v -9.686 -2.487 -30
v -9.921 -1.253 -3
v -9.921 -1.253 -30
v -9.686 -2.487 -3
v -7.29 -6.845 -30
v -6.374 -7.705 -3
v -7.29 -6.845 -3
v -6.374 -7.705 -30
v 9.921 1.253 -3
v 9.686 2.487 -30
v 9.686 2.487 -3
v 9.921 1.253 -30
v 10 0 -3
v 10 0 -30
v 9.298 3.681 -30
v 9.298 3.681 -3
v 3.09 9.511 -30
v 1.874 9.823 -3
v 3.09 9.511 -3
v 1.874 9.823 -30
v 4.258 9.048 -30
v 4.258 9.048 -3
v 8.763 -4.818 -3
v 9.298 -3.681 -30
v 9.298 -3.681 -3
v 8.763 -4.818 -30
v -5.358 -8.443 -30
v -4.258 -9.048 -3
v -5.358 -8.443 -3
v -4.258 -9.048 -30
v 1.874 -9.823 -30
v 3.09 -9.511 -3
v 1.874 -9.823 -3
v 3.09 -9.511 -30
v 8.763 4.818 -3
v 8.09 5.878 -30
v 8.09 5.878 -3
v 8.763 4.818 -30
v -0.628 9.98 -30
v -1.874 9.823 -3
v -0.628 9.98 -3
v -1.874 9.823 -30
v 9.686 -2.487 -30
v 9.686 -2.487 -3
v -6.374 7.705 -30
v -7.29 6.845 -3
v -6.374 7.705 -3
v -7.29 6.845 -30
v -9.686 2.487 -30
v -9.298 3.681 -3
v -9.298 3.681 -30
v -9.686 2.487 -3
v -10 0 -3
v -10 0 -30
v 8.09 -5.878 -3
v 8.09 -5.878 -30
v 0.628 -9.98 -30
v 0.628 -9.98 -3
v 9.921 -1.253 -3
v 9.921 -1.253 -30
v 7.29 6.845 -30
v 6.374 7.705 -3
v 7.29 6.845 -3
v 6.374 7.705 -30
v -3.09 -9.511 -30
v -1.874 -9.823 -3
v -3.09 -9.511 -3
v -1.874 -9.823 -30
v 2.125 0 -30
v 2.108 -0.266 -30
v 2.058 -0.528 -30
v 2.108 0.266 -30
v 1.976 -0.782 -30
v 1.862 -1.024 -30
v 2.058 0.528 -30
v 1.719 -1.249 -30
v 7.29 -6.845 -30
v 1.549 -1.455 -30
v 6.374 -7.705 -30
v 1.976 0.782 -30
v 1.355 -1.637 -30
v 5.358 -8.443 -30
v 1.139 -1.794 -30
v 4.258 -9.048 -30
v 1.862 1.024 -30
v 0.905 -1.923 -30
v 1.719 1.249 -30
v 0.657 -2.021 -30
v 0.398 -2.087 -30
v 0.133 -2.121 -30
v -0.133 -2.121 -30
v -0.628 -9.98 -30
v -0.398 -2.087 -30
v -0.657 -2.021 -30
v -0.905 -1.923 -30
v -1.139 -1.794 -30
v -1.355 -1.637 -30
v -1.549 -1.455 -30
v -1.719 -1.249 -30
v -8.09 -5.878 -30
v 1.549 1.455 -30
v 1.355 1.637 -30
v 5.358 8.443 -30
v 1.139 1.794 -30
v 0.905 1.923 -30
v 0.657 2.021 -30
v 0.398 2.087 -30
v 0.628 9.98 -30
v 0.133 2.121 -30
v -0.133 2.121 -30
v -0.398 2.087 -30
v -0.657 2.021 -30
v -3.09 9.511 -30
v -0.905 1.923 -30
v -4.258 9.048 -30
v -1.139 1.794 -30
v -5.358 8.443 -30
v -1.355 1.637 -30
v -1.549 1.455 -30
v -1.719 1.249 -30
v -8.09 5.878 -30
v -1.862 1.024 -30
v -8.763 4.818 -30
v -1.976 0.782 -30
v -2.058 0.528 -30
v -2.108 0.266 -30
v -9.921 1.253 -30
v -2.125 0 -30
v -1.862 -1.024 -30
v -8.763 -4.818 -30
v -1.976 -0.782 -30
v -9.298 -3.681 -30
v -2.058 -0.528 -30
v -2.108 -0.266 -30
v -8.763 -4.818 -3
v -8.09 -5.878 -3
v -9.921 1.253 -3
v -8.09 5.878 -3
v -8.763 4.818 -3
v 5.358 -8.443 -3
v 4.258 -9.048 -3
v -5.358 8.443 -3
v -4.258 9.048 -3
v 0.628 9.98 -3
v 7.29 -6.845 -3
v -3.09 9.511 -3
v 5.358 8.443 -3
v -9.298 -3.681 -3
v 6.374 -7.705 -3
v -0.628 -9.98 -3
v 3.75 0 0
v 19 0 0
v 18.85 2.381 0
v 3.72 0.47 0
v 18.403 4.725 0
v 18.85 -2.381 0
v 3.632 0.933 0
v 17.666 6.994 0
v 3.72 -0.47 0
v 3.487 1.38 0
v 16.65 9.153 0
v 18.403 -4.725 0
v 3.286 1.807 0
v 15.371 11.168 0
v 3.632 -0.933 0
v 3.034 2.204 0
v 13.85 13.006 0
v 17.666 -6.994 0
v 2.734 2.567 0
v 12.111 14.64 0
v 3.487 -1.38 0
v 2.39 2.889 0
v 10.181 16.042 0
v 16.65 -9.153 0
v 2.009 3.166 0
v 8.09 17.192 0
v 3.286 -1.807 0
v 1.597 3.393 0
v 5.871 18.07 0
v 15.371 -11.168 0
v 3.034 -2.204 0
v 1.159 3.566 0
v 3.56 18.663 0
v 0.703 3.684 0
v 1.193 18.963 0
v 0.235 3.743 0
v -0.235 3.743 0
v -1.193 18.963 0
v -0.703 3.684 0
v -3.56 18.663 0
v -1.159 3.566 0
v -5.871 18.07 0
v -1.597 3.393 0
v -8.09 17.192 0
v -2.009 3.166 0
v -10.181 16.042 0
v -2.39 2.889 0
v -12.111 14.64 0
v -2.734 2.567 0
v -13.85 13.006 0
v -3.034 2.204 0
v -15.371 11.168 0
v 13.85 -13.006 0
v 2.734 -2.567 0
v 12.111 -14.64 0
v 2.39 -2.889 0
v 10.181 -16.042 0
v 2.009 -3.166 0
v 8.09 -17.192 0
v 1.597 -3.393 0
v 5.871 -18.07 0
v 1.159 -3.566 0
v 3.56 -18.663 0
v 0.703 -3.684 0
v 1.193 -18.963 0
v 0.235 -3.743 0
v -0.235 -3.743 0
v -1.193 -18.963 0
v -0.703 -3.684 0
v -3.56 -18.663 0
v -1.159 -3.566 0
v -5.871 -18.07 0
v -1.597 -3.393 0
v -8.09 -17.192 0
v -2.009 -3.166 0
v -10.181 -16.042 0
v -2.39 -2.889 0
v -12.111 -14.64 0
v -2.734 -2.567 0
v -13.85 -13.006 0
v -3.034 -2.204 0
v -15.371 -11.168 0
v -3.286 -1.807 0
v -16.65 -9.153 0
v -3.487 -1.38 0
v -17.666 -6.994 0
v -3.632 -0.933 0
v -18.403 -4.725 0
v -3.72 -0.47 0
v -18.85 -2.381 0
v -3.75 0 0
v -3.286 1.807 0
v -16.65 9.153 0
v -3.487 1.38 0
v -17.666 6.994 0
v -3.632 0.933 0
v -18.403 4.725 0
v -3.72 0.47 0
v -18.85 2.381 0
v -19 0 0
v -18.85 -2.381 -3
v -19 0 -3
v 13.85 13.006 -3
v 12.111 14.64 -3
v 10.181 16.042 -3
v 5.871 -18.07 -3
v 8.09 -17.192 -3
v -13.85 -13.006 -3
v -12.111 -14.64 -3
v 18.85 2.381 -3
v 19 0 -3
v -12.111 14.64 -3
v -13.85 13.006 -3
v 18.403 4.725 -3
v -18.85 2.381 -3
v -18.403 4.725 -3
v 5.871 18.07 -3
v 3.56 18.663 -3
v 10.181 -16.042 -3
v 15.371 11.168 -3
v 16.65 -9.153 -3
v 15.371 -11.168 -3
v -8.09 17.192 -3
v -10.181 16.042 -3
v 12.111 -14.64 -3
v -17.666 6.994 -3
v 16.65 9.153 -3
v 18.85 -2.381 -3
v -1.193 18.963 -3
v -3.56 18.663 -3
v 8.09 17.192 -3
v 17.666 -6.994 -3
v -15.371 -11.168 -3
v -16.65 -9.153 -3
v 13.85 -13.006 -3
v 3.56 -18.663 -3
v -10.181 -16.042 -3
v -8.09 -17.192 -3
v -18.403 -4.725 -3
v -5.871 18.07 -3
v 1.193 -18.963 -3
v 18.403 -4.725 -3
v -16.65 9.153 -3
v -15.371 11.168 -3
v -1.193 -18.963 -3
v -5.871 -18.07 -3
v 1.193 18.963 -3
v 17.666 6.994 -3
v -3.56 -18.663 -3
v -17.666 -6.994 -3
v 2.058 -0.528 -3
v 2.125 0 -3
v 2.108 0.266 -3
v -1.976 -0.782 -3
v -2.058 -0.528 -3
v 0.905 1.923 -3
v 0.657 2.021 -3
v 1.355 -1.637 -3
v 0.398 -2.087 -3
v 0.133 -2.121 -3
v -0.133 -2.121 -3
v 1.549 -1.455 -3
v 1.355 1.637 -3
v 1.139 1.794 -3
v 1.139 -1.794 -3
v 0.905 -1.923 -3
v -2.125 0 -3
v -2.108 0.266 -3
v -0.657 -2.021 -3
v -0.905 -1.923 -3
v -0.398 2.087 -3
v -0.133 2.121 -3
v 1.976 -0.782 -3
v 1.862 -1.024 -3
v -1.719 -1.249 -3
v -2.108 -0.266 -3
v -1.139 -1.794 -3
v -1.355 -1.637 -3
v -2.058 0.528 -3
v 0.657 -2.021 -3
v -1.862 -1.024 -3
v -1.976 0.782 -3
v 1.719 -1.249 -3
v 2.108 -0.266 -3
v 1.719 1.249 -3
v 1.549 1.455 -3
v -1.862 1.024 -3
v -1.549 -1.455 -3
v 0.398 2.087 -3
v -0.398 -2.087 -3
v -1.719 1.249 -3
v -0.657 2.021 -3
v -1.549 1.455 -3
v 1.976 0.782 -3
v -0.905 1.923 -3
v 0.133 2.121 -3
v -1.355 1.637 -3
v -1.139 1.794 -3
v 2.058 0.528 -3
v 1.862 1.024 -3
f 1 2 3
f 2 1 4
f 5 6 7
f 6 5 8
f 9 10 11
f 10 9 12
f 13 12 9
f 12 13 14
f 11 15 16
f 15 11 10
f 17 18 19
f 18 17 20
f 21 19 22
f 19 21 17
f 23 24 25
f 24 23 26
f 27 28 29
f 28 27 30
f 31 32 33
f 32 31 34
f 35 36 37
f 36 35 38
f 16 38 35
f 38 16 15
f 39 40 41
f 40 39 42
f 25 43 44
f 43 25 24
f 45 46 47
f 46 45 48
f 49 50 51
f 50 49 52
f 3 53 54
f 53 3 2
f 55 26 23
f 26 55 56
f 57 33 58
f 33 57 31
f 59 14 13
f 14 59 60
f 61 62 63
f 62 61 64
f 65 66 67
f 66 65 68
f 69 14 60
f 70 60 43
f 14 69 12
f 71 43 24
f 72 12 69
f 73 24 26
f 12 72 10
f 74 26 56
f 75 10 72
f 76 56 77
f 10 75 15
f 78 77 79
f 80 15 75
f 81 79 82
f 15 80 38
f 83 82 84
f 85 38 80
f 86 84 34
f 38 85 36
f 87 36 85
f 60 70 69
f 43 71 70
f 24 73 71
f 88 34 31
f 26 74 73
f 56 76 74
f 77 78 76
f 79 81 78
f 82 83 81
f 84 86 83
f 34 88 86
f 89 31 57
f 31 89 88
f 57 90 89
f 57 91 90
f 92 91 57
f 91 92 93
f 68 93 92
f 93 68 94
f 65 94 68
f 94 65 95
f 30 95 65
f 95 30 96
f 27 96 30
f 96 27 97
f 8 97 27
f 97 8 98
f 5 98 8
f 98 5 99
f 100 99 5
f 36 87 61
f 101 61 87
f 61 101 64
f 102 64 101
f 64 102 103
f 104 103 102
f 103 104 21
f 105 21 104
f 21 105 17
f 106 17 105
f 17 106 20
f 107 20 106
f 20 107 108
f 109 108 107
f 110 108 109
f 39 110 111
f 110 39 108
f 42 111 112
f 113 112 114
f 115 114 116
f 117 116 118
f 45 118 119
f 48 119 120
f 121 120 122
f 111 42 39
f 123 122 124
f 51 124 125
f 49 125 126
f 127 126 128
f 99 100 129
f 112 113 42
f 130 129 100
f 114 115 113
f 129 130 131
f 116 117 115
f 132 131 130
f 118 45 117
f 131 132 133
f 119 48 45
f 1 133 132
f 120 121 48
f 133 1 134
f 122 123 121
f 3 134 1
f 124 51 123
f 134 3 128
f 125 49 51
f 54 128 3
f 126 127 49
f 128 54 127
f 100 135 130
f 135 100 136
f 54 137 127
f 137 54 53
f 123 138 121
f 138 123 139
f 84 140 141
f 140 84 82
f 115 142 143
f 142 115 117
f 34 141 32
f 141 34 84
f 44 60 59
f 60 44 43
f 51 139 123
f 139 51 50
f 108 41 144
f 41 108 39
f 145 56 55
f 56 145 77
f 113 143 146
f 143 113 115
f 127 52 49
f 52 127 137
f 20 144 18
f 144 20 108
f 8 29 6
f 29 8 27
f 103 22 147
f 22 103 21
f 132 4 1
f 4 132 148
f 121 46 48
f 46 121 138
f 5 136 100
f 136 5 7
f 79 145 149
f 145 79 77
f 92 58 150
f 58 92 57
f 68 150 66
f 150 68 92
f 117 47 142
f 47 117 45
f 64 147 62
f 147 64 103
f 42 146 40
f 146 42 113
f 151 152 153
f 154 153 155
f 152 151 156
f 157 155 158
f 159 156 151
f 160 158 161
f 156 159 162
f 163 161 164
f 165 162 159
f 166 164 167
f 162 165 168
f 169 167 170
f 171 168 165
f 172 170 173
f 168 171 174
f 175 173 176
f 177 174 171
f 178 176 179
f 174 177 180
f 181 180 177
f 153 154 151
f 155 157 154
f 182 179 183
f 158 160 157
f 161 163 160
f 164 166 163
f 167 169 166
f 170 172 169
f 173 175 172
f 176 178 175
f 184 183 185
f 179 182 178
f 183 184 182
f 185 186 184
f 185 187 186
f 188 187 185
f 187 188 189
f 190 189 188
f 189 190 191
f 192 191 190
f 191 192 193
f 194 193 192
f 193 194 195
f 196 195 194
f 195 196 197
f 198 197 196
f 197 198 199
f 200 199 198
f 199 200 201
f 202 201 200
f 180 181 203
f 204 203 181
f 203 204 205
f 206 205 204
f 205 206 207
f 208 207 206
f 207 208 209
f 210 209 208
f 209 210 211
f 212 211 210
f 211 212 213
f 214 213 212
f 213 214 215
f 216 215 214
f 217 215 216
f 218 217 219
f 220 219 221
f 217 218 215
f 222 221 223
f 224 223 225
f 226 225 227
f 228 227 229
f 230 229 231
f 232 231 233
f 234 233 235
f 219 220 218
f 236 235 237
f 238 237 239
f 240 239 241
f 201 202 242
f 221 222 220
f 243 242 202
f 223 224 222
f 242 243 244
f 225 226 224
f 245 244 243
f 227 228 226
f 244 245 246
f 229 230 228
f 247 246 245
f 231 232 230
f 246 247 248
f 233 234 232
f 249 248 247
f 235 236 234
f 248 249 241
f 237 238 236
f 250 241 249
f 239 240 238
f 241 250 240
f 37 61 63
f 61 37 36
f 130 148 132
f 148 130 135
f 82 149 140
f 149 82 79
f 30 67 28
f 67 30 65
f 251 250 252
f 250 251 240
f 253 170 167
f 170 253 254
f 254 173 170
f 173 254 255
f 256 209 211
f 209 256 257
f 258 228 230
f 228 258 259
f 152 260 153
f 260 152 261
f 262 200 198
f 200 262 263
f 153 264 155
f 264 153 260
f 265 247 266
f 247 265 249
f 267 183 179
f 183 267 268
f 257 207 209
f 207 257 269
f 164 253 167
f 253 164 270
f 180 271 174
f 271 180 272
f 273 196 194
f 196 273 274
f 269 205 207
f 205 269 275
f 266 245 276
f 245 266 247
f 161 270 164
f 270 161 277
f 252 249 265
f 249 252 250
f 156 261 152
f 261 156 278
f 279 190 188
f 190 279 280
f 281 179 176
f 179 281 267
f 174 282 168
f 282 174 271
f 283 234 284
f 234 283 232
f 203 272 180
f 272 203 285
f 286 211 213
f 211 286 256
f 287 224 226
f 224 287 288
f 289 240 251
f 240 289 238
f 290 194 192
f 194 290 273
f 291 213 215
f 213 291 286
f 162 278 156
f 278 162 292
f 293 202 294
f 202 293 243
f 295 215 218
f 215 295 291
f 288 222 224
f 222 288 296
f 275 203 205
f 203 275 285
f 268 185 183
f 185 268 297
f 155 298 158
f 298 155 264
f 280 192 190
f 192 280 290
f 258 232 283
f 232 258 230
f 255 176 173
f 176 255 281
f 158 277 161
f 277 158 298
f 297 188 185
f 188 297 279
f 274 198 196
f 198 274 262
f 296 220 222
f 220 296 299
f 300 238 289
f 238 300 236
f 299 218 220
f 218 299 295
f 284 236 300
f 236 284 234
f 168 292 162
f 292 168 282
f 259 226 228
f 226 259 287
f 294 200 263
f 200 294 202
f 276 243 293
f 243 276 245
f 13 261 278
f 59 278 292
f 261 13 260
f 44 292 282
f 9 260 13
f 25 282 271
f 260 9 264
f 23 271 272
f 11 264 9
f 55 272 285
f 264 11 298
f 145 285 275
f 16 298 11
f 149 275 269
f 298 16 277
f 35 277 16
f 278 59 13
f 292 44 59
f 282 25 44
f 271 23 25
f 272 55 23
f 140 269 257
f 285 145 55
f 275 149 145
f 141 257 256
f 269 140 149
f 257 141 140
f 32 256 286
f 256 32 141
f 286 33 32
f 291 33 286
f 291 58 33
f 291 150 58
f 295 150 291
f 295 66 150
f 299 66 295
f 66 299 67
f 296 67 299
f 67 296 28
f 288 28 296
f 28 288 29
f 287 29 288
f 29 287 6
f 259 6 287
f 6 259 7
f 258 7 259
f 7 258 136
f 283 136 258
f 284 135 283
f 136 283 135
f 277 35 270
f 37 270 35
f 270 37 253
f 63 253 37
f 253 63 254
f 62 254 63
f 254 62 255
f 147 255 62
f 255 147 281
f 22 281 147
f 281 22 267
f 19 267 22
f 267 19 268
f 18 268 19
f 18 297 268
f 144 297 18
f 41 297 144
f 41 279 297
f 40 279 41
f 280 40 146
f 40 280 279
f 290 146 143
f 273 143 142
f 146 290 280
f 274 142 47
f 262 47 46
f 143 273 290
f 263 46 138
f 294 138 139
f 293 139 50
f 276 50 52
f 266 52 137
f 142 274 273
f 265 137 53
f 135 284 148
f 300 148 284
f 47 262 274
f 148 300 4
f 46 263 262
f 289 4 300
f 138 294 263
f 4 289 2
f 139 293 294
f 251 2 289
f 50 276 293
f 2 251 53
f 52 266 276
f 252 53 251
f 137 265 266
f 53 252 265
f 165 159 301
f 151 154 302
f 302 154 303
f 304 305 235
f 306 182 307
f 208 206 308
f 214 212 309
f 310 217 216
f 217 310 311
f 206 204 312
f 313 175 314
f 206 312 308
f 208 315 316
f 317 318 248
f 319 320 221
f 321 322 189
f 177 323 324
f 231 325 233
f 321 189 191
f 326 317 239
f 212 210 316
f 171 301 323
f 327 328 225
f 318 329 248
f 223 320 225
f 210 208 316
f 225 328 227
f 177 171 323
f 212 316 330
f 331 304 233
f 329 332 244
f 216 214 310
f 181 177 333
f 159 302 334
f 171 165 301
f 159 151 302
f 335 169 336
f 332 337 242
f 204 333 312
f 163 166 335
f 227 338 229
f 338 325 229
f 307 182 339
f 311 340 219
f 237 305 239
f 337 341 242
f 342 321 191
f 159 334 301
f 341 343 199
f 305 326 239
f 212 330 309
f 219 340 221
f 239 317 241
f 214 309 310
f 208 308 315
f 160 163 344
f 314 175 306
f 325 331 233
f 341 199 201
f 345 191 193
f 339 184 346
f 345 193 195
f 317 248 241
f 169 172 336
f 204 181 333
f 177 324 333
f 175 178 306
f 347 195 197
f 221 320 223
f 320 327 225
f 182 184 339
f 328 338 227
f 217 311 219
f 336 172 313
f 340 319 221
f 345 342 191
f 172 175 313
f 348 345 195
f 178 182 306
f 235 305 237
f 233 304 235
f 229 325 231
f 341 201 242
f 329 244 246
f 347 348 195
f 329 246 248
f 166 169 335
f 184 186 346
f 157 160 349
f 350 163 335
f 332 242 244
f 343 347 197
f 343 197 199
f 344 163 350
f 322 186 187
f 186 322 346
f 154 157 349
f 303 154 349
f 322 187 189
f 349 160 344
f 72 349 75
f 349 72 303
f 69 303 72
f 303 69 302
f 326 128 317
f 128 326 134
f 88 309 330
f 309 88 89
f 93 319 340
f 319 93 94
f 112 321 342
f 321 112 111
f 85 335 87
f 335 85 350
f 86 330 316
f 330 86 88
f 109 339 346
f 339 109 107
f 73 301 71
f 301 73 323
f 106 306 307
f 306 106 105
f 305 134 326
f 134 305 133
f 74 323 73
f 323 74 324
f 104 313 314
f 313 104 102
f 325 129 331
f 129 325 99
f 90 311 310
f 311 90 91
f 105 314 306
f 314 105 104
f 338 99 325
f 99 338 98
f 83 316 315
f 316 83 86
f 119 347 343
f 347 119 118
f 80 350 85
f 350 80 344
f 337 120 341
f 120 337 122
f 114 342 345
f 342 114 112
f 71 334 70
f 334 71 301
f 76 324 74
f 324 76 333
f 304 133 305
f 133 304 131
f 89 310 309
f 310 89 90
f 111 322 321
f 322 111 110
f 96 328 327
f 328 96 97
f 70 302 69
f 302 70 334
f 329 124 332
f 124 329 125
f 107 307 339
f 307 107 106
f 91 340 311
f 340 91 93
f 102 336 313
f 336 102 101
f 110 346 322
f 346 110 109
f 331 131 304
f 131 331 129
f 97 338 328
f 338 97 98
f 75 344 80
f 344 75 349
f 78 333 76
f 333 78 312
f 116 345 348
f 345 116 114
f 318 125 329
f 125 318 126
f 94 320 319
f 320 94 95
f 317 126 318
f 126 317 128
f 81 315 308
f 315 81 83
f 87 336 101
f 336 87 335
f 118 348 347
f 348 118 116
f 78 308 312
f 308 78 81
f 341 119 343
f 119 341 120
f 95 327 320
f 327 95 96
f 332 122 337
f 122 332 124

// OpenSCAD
$fn = 50;


difference() {
	union() {
		translate(v = [0, 0, -30.0000000000]) {
			cylinder(h = 30, r = 10.0000000000);
		}
		translate(v = [0, 0, -3.0000000000]) {
			cylinder(h = 3, r = 19.0000000000);
		}
	}
	union() {
		translate(v = [0, 0, 0]) {
			rotate(a = [0, 0, 0]) {
				difference() {
					union() {
						#translate(v = [0, 0, -30.0000000000]) {
							cylinder(h = 30, r = 2.0000000000);
						}
						#translate(v = [0, 0, -3]) {
							cylinder(h = 3, r = 10.0000000000, r1 = 2.1250000000, r2 = 3.7500000000);
						}
						#translate(v = [0, 0, -30.0000000000]) {
							cylinder(h = 30, r = 2.1250000000);
						}
						#translate(v = [0, 0, -30.0000000000]) {
							cylinder(h = 30, r = 2.0000000000);
						}
					}
					union();
				}
			}
		}
	}
}
